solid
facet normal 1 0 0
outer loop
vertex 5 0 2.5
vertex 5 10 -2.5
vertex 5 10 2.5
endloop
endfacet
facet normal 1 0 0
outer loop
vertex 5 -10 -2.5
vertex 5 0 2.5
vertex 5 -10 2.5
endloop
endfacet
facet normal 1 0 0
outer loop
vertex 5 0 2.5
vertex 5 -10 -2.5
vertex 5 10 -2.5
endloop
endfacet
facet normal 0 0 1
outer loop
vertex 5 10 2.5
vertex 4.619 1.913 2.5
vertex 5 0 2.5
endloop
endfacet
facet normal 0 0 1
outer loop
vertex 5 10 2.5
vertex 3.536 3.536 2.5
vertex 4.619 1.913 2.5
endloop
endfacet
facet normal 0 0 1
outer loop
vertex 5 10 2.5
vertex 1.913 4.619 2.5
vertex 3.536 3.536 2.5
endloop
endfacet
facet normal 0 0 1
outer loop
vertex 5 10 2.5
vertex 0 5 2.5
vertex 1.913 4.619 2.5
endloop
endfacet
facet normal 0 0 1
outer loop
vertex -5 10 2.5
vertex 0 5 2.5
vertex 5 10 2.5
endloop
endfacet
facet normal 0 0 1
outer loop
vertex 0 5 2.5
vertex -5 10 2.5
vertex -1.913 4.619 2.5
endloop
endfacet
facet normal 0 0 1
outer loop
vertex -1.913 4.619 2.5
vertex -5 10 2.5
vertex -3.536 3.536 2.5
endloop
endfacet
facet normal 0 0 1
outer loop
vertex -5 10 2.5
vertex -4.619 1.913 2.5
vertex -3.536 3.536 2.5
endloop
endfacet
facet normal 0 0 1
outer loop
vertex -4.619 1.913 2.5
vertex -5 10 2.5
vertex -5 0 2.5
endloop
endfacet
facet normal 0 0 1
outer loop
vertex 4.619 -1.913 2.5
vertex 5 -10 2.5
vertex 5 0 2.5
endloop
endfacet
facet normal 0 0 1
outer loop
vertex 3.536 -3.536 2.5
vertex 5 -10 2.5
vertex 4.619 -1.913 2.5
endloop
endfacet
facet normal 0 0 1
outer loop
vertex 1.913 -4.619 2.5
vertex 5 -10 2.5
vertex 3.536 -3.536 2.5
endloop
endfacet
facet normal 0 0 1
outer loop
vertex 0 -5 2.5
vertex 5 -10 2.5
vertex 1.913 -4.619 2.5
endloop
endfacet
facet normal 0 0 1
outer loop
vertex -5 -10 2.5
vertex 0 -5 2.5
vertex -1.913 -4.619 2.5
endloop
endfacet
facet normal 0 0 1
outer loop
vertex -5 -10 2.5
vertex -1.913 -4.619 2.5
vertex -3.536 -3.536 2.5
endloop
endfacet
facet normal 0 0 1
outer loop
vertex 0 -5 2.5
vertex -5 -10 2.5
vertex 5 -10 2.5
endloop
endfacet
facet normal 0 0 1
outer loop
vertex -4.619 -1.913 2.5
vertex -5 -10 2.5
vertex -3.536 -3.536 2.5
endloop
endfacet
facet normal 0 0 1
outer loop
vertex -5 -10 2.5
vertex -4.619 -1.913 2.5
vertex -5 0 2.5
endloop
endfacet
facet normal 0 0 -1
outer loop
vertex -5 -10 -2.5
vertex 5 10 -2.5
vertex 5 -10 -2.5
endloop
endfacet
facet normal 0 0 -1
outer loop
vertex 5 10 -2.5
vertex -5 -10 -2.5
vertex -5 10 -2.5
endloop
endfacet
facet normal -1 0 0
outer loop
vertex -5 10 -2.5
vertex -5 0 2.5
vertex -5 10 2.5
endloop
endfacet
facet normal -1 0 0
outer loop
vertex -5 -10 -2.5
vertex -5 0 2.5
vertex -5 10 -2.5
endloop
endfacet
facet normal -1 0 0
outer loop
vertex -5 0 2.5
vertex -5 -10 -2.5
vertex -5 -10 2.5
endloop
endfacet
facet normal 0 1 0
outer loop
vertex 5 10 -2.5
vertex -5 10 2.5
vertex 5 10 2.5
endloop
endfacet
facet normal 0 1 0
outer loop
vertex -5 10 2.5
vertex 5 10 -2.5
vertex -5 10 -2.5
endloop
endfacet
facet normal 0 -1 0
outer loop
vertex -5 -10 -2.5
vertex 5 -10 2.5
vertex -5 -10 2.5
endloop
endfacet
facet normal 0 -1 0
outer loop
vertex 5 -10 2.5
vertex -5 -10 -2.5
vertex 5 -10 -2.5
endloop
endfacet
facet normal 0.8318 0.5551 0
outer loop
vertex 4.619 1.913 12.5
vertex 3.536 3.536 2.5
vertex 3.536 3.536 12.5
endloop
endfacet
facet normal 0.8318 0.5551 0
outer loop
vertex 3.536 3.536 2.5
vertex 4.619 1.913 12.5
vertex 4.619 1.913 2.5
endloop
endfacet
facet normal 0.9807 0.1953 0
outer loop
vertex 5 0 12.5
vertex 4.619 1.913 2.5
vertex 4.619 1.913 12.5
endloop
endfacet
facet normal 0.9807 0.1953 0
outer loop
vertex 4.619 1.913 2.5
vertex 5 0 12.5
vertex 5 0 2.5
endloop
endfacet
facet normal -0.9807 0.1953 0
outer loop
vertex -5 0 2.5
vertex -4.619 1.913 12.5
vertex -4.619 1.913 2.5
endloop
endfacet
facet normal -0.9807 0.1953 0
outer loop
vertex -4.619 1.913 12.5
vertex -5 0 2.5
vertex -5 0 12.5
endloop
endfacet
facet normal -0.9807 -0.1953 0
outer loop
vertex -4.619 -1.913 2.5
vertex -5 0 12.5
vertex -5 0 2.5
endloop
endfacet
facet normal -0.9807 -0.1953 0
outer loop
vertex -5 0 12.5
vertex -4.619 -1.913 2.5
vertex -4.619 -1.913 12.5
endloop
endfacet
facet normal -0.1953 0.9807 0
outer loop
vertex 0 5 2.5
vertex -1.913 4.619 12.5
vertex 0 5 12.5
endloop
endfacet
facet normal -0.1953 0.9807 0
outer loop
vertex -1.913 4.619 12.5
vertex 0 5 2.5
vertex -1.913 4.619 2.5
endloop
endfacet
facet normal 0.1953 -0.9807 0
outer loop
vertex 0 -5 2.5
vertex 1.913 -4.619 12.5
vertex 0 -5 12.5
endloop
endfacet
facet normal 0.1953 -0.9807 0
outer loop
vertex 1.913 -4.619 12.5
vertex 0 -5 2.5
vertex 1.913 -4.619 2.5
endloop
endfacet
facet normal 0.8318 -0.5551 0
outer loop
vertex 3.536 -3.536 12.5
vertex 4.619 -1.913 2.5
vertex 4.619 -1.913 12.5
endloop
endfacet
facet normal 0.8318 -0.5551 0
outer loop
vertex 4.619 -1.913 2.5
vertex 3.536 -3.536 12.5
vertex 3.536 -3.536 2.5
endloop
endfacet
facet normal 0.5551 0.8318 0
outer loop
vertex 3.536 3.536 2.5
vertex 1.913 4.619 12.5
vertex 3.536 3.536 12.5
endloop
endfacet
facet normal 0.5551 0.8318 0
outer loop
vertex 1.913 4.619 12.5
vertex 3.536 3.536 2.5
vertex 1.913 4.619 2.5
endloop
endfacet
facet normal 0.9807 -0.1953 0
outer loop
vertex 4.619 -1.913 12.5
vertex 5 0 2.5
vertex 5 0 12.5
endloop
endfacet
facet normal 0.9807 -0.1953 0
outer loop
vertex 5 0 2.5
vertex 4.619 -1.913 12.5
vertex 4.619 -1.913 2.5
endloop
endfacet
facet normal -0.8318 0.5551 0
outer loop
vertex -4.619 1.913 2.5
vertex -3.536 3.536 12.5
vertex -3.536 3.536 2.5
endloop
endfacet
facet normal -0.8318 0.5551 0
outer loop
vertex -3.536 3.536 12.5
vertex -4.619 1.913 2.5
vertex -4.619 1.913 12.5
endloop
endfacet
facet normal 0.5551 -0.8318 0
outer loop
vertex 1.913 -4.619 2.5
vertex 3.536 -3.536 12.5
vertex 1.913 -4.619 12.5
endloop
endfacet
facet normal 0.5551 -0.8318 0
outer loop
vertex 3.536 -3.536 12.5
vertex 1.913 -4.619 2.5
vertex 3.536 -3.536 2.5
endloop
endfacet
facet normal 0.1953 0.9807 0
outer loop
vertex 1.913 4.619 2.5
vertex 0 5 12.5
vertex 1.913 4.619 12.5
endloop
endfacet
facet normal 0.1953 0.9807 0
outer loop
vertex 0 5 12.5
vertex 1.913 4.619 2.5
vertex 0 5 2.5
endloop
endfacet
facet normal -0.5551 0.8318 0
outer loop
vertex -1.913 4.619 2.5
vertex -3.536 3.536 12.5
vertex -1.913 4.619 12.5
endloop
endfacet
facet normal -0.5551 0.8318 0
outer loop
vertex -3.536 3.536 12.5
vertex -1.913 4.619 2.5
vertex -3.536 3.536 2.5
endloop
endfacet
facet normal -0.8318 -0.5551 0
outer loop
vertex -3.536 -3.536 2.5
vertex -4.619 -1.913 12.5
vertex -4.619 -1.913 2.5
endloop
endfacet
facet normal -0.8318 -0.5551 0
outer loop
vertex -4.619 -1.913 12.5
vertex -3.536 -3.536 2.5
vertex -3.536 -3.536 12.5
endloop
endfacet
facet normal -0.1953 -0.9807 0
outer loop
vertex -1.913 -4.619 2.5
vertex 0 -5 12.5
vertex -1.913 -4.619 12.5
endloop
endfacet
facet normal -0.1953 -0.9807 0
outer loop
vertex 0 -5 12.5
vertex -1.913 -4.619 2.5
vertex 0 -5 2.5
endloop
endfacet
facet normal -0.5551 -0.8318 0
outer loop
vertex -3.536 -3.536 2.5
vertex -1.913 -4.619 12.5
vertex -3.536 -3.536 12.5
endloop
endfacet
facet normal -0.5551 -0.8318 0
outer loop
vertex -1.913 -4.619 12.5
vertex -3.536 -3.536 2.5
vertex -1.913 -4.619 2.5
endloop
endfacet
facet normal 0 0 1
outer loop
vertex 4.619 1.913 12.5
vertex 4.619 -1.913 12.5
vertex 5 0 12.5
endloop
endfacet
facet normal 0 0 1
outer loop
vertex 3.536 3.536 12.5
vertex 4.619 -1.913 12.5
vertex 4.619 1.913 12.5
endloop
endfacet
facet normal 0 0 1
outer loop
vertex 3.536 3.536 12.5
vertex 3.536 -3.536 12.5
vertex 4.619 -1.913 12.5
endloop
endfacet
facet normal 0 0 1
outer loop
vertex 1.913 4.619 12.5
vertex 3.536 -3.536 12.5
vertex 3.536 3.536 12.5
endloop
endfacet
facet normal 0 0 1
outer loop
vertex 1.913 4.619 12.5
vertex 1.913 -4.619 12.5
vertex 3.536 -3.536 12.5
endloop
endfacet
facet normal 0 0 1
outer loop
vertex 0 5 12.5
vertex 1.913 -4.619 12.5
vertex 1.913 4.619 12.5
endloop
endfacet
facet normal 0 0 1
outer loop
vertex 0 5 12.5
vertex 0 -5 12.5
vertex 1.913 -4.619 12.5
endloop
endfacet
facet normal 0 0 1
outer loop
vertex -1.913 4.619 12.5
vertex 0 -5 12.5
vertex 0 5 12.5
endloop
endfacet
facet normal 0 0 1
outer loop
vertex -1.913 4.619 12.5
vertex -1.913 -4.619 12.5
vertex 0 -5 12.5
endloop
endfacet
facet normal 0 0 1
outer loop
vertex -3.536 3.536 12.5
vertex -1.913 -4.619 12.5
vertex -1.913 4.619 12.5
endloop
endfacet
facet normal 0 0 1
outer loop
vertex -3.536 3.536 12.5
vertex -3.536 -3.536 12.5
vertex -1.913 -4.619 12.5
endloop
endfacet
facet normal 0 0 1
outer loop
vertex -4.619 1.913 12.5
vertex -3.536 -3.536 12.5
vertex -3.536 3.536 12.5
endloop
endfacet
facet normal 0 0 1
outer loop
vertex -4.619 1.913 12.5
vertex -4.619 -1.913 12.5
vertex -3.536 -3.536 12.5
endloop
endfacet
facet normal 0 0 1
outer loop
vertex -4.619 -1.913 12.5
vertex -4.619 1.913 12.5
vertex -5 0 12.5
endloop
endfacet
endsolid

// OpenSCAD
union(){
    cube([10,20,5],center = true);
    translate([0,0,2.5]){
        cylinder(10, r = 5);
    }
}
